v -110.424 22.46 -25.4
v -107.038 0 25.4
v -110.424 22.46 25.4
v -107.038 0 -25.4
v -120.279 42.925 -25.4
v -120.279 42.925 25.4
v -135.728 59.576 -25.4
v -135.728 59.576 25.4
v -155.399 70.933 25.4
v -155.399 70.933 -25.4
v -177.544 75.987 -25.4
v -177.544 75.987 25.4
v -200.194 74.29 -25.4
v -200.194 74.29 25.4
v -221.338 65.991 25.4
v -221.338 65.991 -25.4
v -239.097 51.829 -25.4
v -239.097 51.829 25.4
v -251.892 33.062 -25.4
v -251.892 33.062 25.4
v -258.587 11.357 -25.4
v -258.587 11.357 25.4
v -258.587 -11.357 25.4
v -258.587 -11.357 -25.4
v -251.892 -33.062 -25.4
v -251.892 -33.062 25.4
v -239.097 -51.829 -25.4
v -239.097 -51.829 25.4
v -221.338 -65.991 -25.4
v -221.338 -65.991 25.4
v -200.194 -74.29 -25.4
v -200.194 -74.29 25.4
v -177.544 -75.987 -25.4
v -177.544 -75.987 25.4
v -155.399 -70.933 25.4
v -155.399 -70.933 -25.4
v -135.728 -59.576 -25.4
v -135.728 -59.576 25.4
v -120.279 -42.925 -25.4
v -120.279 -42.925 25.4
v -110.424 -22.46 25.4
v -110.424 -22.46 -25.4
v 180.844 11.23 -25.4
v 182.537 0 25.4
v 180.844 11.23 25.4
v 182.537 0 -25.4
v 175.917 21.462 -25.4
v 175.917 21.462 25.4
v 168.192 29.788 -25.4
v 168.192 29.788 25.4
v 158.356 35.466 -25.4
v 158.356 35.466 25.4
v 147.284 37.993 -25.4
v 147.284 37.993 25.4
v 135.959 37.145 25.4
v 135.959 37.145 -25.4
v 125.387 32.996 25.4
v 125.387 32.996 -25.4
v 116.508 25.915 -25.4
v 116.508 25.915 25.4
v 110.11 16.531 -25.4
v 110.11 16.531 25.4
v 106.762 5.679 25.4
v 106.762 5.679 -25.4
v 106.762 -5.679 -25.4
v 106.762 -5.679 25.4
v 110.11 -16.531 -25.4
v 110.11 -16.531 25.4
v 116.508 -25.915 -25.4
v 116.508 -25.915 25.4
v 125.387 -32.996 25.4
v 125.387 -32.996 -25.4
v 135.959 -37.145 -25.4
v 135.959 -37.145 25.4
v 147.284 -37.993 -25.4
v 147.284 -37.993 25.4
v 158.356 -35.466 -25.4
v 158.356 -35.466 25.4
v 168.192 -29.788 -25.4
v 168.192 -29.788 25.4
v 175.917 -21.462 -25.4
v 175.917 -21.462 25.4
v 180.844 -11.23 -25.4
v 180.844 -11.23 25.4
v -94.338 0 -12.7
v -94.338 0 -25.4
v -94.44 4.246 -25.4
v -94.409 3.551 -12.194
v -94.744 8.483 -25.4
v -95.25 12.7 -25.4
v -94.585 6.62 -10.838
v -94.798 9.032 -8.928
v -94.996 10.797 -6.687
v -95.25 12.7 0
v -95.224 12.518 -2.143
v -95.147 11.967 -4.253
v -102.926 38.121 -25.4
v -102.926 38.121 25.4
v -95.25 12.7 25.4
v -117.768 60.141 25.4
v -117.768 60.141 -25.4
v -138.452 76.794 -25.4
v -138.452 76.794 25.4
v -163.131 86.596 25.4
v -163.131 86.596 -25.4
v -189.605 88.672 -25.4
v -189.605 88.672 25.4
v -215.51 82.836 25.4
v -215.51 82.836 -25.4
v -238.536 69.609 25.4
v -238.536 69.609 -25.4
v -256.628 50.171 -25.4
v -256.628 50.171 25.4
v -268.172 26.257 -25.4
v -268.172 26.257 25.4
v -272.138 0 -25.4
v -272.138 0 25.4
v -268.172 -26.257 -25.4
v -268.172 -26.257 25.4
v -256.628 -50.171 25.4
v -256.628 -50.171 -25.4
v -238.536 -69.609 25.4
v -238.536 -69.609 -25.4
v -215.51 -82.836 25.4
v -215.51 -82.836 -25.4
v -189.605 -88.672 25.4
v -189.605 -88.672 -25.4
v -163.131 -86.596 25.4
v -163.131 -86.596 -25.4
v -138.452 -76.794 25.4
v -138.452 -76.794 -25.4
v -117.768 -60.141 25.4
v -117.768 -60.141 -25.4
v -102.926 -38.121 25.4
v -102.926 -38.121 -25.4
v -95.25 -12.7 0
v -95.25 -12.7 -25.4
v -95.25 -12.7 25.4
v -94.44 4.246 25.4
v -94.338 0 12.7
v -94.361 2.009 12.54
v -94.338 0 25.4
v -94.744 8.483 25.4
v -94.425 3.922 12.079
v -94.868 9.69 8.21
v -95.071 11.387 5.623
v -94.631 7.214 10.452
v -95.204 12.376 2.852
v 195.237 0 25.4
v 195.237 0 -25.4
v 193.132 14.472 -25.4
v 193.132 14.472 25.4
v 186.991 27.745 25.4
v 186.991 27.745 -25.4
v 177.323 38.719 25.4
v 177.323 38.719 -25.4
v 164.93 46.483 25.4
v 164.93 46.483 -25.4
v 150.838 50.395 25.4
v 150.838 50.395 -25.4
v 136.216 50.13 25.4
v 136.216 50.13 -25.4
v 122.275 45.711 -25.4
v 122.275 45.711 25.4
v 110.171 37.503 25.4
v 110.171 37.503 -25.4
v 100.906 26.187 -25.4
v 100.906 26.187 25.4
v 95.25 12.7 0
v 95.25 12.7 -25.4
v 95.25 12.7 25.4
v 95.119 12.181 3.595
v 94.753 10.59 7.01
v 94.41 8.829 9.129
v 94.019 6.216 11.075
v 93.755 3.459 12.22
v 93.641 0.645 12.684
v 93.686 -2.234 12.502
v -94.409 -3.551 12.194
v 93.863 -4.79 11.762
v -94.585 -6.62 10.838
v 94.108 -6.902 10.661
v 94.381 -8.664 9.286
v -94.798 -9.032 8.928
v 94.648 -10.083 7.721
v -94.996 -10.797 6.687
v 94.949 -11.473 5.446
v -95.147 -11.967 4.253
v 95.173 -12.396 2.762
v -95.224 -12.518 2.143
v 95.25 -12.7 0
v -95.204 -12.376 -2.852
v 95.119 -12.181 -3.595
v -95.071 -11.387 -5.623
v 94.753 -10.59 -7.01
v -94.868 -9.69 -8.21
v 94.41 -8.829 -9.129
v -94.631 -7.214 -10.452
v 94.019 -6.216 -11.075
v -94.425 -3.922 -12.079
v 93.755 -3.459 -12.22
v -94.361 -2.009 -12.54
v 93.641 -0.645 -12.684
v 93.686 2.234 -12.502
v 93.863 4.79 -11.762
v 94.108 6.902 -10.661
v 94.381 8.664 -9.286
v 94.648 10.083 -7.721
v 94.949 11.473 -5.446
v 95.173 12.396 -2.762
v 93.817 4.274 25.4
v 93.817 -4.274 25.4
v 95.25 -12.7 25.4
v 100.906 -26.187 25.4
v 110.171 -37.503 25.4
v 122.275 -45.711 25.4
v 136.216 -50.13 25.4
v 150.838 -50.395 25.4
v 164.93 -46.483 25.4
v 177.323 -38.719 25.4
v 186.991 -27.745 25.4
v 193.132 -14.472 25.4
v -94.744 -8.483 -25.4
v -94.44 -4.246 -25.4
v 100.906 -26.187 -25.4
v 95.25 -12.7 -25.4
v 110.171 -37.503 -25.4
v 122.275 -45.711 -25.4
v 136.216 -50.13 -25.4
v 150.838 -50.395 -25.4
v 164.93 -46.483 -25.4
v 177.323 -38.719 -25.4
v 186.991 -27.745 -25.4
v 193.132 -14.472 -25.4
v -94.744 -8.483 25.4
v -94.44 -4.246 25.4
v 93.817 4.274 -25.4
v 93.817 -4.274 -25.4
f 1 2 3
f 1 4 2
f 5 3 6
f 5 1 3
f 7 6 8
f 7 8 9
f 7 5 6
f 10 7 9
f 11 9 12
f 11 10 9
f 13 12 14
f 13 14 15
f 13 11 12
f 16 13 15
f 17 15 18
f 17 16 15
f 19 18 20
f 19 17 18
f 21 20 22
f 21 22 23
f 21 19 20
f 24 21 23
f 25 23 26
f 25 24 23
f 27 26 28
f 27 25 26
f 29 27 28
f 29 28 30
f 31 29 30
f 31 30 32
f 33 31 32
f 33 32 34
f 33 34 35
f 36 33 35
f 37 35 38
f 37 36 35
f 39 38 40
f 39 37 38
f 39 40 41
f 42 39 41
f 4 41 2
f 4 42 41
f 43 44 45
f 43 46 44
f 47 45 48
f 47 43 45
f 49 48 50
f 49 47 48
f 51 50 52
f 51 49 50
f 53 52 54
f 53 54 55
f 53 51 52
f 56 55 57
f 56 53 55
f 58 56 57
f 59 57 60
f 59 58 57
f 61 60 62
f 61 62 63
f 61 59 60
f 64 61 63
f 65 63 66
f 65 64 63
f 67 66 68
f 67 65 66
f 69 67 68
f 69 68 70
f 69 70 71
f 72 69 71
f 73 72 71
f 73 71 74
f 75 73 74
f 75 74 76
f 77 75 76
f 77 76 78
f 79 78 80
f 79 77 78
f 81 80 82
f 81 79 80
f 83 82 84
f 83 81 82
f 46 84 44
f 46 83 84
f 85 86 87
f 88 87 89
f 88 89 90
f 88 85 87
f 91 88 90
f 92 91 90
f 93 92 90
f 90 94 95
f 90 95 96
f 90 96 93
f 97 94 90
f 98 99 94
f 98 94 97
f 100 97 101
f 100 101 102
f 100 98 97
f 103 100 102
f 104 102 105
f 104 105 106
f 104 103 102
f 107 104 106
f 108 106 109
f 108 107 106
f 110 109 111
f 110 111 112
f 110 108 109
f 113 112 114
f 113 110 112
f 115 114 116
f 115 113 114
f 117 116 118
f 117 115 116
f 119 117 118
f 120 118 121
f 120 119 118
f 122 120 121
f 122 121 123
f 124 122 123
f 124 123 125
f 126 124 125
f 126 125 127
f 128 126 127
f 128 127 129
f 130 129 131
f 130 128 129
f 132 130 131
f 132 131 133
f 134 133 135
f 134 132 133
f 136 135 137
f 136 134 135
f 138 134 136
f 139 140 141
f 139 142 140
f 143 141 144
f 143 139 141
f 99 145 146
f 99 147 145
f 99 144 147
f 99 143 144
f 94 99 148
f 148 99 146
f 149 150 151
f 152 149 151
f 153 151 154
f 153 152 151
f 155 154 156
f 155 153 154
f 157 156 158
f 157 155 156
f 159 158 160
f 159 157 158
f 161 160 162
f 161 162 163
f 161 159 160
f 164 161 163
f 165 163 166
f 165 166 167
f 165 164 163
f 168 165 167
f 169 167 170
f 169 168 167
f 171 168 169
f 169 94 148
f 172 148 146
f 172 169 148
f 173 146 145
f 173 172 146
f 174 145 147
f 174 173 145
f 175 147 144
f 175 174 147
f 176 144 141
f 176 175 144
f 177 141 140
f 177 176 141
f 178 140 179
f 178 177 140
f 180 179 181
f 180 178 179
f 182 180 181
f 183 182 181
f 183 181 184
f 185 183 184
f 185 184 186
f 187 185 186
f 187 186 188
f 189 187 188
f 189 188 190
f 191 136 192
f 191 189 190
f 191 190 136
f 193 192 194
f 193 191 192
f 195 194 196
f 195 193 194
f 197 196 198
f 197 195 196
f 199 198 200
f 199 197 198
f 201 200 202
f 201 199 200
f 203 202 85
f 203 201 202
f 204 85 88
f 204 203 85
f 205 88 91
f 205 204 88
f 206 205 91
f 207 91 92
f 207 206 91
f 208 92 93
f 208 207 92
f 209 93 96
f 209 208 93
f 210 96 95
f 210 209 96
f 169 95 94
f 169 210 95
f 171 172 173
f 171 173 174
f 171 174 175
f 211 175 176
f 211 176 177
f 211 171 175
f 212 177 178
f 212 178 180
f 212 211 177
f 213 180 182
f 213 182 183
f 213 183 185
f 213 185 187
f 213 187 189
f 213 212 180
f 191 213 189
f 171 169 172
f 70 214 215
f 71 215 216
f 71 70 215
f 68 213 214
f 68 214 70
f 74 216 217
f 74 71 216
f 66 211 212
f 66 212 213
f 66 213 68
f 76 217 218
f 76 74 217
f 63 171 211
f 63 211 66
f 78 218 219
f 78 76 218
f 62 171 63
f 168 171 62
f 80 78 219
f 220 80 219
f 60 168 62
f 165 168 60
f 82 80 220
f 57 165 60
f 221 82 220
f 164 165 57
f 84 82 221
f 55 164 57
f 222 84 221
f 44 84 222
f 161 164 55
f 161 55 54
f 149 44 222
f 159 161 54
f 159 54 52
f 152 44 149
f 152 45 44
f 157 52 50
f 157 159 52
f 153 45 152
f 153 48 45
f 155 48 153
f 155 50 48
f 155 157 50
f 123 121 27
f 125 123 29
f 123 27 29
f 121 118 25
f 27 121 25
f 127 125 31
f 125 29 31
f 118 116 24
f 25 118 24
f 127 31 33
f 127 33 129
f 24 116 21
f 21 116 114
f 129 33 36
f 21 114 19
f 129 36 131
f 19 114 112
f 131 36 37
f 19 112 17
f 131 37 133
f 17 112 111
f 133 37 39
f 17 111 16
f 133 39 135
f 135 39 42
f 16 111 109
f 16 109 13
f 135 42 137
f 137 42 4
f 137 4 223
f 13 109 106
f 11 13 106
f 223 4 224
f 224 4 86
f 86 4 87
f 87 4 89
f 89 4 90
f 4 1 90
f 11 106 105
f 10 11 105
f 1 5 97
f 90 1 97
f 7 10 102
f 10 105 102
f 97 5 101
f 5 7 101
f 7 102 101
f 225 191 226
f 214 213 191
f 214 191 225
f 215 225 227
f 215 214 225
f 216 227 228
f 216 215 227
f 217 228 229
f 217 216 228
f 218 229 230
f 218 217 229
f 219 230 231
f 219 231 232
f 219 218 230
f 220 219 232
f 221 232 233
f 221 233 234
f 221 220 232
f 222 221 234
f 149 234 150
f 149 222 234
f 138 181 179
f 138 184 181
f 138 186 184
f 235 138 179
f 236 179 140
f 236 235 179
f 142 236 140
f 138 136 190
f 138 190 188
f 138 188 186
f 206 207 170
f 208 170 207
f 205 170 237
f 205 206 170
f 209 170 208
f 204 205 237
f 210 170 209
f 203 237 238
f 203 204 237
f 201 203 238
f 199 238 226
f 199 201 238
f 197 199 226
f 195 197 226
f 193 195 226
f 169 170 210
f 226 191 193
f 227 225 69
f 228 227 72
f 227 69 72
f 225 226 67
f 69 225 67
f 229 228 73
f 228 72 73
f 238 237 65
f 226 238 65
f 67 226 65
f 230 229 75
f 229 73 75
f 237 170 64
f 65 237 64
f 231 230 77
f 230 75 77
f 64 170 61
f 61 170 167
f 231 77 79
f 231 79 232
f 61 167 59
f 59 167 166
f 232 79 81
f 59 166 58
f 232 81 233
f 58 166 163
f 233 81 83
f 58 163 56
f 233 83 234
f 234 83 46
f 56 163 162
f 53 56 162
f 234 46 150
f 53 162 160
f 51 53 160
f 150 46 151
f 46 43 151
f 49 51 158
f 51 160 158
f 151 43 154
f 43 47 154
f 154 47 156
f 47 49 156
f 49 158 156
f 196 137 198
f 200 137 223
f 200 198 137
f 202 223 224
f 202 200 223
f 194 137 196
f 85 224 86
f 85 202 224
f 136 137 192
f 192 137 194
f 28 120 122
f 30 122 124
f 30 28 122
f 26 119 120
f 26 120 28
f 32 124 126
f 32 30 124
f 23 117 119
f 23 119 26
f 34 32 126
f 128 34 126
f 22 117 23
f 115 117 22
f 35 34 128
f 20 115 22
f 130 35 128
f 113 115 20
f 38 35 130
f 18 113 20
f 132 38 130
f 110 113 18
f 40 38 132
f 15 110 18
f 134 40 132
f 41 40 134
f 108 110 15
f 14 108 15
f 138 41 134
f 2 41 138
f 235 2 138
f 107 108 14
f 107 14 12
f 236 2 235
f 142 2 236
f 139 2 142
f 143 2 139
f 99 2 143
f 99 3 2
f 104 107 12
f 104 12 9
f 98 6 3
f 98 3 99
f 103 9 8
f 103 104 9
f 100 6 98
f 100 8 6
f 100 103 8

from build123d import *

# Parameters (mm, degrees)
F0_R     = 12.7
F1_DEPTH = 95.25
F2_R     = 76.2
F3_DEPTH = 25.4
F4_R     = 38.1
F5_DEPTH = 25.4


with BuildPart() as f1:
    # F0 (on Right) → F1 (new body, symmetric)
    with BuildSketch(Plane.YZ):
        Circle(F0_R)
    extrude(amount=F1_DEPTH, both=True)

    # F2 (on Top) → F3 (join, symmetric)
    with BuildSketch(Plane.XY):
        with BuildLine():
            ThreePointArc((-94.338181, 0), (-94.566429, 6.366345), (-95.25, 12.7))
            Line((-95.25, 12.7), (-95.25, -12.7))
            ThreePointArc((-95.25, -12.7), (-94.566429, -6.366345), (-94.338181, 0))
        make_face()
        with BuildLine():
            Line((-95.25, -12.7), (-95.25, 12.7))
            ThreePointArc((-95.25, 12.7), (-272.138181, 0), (-95.25, -12.7))
        make_face()
        with Locations((-183.238181, 0)):
            Circle(F2_R, mode=Mode.SUBTRACT)
    extrude(amount=F3_DEPTH, both=True)

    # F4 (on Top) → F5 (join, symmetric)
    with BuildSketch(Plane.XY):
        with BuildLine():
            Line((95.25, -12.7), (95.25, 12.7))
            ThreePointArc((95.25, 12.7), (93.636888, 0), (95.25, -12.7))
        make_face()
        with BuildLine():
            ThreePointArc((195.236888, 0), (150.837907, 50.395109), (95.25, 12.7))
            Line((95.25, 12.7), (95.25, -12.7))
            ThreePointArc((95.25, -12.7), (150.837907, -50.395109), (195.236888, 0))
        make_face()
        with Locations((144.436888, 0)):
            Circle(F4_R, mode=Mode.SUBTRACT)
    extrude(amount=F5_DEPTH, both=True)


solid = f1.part
